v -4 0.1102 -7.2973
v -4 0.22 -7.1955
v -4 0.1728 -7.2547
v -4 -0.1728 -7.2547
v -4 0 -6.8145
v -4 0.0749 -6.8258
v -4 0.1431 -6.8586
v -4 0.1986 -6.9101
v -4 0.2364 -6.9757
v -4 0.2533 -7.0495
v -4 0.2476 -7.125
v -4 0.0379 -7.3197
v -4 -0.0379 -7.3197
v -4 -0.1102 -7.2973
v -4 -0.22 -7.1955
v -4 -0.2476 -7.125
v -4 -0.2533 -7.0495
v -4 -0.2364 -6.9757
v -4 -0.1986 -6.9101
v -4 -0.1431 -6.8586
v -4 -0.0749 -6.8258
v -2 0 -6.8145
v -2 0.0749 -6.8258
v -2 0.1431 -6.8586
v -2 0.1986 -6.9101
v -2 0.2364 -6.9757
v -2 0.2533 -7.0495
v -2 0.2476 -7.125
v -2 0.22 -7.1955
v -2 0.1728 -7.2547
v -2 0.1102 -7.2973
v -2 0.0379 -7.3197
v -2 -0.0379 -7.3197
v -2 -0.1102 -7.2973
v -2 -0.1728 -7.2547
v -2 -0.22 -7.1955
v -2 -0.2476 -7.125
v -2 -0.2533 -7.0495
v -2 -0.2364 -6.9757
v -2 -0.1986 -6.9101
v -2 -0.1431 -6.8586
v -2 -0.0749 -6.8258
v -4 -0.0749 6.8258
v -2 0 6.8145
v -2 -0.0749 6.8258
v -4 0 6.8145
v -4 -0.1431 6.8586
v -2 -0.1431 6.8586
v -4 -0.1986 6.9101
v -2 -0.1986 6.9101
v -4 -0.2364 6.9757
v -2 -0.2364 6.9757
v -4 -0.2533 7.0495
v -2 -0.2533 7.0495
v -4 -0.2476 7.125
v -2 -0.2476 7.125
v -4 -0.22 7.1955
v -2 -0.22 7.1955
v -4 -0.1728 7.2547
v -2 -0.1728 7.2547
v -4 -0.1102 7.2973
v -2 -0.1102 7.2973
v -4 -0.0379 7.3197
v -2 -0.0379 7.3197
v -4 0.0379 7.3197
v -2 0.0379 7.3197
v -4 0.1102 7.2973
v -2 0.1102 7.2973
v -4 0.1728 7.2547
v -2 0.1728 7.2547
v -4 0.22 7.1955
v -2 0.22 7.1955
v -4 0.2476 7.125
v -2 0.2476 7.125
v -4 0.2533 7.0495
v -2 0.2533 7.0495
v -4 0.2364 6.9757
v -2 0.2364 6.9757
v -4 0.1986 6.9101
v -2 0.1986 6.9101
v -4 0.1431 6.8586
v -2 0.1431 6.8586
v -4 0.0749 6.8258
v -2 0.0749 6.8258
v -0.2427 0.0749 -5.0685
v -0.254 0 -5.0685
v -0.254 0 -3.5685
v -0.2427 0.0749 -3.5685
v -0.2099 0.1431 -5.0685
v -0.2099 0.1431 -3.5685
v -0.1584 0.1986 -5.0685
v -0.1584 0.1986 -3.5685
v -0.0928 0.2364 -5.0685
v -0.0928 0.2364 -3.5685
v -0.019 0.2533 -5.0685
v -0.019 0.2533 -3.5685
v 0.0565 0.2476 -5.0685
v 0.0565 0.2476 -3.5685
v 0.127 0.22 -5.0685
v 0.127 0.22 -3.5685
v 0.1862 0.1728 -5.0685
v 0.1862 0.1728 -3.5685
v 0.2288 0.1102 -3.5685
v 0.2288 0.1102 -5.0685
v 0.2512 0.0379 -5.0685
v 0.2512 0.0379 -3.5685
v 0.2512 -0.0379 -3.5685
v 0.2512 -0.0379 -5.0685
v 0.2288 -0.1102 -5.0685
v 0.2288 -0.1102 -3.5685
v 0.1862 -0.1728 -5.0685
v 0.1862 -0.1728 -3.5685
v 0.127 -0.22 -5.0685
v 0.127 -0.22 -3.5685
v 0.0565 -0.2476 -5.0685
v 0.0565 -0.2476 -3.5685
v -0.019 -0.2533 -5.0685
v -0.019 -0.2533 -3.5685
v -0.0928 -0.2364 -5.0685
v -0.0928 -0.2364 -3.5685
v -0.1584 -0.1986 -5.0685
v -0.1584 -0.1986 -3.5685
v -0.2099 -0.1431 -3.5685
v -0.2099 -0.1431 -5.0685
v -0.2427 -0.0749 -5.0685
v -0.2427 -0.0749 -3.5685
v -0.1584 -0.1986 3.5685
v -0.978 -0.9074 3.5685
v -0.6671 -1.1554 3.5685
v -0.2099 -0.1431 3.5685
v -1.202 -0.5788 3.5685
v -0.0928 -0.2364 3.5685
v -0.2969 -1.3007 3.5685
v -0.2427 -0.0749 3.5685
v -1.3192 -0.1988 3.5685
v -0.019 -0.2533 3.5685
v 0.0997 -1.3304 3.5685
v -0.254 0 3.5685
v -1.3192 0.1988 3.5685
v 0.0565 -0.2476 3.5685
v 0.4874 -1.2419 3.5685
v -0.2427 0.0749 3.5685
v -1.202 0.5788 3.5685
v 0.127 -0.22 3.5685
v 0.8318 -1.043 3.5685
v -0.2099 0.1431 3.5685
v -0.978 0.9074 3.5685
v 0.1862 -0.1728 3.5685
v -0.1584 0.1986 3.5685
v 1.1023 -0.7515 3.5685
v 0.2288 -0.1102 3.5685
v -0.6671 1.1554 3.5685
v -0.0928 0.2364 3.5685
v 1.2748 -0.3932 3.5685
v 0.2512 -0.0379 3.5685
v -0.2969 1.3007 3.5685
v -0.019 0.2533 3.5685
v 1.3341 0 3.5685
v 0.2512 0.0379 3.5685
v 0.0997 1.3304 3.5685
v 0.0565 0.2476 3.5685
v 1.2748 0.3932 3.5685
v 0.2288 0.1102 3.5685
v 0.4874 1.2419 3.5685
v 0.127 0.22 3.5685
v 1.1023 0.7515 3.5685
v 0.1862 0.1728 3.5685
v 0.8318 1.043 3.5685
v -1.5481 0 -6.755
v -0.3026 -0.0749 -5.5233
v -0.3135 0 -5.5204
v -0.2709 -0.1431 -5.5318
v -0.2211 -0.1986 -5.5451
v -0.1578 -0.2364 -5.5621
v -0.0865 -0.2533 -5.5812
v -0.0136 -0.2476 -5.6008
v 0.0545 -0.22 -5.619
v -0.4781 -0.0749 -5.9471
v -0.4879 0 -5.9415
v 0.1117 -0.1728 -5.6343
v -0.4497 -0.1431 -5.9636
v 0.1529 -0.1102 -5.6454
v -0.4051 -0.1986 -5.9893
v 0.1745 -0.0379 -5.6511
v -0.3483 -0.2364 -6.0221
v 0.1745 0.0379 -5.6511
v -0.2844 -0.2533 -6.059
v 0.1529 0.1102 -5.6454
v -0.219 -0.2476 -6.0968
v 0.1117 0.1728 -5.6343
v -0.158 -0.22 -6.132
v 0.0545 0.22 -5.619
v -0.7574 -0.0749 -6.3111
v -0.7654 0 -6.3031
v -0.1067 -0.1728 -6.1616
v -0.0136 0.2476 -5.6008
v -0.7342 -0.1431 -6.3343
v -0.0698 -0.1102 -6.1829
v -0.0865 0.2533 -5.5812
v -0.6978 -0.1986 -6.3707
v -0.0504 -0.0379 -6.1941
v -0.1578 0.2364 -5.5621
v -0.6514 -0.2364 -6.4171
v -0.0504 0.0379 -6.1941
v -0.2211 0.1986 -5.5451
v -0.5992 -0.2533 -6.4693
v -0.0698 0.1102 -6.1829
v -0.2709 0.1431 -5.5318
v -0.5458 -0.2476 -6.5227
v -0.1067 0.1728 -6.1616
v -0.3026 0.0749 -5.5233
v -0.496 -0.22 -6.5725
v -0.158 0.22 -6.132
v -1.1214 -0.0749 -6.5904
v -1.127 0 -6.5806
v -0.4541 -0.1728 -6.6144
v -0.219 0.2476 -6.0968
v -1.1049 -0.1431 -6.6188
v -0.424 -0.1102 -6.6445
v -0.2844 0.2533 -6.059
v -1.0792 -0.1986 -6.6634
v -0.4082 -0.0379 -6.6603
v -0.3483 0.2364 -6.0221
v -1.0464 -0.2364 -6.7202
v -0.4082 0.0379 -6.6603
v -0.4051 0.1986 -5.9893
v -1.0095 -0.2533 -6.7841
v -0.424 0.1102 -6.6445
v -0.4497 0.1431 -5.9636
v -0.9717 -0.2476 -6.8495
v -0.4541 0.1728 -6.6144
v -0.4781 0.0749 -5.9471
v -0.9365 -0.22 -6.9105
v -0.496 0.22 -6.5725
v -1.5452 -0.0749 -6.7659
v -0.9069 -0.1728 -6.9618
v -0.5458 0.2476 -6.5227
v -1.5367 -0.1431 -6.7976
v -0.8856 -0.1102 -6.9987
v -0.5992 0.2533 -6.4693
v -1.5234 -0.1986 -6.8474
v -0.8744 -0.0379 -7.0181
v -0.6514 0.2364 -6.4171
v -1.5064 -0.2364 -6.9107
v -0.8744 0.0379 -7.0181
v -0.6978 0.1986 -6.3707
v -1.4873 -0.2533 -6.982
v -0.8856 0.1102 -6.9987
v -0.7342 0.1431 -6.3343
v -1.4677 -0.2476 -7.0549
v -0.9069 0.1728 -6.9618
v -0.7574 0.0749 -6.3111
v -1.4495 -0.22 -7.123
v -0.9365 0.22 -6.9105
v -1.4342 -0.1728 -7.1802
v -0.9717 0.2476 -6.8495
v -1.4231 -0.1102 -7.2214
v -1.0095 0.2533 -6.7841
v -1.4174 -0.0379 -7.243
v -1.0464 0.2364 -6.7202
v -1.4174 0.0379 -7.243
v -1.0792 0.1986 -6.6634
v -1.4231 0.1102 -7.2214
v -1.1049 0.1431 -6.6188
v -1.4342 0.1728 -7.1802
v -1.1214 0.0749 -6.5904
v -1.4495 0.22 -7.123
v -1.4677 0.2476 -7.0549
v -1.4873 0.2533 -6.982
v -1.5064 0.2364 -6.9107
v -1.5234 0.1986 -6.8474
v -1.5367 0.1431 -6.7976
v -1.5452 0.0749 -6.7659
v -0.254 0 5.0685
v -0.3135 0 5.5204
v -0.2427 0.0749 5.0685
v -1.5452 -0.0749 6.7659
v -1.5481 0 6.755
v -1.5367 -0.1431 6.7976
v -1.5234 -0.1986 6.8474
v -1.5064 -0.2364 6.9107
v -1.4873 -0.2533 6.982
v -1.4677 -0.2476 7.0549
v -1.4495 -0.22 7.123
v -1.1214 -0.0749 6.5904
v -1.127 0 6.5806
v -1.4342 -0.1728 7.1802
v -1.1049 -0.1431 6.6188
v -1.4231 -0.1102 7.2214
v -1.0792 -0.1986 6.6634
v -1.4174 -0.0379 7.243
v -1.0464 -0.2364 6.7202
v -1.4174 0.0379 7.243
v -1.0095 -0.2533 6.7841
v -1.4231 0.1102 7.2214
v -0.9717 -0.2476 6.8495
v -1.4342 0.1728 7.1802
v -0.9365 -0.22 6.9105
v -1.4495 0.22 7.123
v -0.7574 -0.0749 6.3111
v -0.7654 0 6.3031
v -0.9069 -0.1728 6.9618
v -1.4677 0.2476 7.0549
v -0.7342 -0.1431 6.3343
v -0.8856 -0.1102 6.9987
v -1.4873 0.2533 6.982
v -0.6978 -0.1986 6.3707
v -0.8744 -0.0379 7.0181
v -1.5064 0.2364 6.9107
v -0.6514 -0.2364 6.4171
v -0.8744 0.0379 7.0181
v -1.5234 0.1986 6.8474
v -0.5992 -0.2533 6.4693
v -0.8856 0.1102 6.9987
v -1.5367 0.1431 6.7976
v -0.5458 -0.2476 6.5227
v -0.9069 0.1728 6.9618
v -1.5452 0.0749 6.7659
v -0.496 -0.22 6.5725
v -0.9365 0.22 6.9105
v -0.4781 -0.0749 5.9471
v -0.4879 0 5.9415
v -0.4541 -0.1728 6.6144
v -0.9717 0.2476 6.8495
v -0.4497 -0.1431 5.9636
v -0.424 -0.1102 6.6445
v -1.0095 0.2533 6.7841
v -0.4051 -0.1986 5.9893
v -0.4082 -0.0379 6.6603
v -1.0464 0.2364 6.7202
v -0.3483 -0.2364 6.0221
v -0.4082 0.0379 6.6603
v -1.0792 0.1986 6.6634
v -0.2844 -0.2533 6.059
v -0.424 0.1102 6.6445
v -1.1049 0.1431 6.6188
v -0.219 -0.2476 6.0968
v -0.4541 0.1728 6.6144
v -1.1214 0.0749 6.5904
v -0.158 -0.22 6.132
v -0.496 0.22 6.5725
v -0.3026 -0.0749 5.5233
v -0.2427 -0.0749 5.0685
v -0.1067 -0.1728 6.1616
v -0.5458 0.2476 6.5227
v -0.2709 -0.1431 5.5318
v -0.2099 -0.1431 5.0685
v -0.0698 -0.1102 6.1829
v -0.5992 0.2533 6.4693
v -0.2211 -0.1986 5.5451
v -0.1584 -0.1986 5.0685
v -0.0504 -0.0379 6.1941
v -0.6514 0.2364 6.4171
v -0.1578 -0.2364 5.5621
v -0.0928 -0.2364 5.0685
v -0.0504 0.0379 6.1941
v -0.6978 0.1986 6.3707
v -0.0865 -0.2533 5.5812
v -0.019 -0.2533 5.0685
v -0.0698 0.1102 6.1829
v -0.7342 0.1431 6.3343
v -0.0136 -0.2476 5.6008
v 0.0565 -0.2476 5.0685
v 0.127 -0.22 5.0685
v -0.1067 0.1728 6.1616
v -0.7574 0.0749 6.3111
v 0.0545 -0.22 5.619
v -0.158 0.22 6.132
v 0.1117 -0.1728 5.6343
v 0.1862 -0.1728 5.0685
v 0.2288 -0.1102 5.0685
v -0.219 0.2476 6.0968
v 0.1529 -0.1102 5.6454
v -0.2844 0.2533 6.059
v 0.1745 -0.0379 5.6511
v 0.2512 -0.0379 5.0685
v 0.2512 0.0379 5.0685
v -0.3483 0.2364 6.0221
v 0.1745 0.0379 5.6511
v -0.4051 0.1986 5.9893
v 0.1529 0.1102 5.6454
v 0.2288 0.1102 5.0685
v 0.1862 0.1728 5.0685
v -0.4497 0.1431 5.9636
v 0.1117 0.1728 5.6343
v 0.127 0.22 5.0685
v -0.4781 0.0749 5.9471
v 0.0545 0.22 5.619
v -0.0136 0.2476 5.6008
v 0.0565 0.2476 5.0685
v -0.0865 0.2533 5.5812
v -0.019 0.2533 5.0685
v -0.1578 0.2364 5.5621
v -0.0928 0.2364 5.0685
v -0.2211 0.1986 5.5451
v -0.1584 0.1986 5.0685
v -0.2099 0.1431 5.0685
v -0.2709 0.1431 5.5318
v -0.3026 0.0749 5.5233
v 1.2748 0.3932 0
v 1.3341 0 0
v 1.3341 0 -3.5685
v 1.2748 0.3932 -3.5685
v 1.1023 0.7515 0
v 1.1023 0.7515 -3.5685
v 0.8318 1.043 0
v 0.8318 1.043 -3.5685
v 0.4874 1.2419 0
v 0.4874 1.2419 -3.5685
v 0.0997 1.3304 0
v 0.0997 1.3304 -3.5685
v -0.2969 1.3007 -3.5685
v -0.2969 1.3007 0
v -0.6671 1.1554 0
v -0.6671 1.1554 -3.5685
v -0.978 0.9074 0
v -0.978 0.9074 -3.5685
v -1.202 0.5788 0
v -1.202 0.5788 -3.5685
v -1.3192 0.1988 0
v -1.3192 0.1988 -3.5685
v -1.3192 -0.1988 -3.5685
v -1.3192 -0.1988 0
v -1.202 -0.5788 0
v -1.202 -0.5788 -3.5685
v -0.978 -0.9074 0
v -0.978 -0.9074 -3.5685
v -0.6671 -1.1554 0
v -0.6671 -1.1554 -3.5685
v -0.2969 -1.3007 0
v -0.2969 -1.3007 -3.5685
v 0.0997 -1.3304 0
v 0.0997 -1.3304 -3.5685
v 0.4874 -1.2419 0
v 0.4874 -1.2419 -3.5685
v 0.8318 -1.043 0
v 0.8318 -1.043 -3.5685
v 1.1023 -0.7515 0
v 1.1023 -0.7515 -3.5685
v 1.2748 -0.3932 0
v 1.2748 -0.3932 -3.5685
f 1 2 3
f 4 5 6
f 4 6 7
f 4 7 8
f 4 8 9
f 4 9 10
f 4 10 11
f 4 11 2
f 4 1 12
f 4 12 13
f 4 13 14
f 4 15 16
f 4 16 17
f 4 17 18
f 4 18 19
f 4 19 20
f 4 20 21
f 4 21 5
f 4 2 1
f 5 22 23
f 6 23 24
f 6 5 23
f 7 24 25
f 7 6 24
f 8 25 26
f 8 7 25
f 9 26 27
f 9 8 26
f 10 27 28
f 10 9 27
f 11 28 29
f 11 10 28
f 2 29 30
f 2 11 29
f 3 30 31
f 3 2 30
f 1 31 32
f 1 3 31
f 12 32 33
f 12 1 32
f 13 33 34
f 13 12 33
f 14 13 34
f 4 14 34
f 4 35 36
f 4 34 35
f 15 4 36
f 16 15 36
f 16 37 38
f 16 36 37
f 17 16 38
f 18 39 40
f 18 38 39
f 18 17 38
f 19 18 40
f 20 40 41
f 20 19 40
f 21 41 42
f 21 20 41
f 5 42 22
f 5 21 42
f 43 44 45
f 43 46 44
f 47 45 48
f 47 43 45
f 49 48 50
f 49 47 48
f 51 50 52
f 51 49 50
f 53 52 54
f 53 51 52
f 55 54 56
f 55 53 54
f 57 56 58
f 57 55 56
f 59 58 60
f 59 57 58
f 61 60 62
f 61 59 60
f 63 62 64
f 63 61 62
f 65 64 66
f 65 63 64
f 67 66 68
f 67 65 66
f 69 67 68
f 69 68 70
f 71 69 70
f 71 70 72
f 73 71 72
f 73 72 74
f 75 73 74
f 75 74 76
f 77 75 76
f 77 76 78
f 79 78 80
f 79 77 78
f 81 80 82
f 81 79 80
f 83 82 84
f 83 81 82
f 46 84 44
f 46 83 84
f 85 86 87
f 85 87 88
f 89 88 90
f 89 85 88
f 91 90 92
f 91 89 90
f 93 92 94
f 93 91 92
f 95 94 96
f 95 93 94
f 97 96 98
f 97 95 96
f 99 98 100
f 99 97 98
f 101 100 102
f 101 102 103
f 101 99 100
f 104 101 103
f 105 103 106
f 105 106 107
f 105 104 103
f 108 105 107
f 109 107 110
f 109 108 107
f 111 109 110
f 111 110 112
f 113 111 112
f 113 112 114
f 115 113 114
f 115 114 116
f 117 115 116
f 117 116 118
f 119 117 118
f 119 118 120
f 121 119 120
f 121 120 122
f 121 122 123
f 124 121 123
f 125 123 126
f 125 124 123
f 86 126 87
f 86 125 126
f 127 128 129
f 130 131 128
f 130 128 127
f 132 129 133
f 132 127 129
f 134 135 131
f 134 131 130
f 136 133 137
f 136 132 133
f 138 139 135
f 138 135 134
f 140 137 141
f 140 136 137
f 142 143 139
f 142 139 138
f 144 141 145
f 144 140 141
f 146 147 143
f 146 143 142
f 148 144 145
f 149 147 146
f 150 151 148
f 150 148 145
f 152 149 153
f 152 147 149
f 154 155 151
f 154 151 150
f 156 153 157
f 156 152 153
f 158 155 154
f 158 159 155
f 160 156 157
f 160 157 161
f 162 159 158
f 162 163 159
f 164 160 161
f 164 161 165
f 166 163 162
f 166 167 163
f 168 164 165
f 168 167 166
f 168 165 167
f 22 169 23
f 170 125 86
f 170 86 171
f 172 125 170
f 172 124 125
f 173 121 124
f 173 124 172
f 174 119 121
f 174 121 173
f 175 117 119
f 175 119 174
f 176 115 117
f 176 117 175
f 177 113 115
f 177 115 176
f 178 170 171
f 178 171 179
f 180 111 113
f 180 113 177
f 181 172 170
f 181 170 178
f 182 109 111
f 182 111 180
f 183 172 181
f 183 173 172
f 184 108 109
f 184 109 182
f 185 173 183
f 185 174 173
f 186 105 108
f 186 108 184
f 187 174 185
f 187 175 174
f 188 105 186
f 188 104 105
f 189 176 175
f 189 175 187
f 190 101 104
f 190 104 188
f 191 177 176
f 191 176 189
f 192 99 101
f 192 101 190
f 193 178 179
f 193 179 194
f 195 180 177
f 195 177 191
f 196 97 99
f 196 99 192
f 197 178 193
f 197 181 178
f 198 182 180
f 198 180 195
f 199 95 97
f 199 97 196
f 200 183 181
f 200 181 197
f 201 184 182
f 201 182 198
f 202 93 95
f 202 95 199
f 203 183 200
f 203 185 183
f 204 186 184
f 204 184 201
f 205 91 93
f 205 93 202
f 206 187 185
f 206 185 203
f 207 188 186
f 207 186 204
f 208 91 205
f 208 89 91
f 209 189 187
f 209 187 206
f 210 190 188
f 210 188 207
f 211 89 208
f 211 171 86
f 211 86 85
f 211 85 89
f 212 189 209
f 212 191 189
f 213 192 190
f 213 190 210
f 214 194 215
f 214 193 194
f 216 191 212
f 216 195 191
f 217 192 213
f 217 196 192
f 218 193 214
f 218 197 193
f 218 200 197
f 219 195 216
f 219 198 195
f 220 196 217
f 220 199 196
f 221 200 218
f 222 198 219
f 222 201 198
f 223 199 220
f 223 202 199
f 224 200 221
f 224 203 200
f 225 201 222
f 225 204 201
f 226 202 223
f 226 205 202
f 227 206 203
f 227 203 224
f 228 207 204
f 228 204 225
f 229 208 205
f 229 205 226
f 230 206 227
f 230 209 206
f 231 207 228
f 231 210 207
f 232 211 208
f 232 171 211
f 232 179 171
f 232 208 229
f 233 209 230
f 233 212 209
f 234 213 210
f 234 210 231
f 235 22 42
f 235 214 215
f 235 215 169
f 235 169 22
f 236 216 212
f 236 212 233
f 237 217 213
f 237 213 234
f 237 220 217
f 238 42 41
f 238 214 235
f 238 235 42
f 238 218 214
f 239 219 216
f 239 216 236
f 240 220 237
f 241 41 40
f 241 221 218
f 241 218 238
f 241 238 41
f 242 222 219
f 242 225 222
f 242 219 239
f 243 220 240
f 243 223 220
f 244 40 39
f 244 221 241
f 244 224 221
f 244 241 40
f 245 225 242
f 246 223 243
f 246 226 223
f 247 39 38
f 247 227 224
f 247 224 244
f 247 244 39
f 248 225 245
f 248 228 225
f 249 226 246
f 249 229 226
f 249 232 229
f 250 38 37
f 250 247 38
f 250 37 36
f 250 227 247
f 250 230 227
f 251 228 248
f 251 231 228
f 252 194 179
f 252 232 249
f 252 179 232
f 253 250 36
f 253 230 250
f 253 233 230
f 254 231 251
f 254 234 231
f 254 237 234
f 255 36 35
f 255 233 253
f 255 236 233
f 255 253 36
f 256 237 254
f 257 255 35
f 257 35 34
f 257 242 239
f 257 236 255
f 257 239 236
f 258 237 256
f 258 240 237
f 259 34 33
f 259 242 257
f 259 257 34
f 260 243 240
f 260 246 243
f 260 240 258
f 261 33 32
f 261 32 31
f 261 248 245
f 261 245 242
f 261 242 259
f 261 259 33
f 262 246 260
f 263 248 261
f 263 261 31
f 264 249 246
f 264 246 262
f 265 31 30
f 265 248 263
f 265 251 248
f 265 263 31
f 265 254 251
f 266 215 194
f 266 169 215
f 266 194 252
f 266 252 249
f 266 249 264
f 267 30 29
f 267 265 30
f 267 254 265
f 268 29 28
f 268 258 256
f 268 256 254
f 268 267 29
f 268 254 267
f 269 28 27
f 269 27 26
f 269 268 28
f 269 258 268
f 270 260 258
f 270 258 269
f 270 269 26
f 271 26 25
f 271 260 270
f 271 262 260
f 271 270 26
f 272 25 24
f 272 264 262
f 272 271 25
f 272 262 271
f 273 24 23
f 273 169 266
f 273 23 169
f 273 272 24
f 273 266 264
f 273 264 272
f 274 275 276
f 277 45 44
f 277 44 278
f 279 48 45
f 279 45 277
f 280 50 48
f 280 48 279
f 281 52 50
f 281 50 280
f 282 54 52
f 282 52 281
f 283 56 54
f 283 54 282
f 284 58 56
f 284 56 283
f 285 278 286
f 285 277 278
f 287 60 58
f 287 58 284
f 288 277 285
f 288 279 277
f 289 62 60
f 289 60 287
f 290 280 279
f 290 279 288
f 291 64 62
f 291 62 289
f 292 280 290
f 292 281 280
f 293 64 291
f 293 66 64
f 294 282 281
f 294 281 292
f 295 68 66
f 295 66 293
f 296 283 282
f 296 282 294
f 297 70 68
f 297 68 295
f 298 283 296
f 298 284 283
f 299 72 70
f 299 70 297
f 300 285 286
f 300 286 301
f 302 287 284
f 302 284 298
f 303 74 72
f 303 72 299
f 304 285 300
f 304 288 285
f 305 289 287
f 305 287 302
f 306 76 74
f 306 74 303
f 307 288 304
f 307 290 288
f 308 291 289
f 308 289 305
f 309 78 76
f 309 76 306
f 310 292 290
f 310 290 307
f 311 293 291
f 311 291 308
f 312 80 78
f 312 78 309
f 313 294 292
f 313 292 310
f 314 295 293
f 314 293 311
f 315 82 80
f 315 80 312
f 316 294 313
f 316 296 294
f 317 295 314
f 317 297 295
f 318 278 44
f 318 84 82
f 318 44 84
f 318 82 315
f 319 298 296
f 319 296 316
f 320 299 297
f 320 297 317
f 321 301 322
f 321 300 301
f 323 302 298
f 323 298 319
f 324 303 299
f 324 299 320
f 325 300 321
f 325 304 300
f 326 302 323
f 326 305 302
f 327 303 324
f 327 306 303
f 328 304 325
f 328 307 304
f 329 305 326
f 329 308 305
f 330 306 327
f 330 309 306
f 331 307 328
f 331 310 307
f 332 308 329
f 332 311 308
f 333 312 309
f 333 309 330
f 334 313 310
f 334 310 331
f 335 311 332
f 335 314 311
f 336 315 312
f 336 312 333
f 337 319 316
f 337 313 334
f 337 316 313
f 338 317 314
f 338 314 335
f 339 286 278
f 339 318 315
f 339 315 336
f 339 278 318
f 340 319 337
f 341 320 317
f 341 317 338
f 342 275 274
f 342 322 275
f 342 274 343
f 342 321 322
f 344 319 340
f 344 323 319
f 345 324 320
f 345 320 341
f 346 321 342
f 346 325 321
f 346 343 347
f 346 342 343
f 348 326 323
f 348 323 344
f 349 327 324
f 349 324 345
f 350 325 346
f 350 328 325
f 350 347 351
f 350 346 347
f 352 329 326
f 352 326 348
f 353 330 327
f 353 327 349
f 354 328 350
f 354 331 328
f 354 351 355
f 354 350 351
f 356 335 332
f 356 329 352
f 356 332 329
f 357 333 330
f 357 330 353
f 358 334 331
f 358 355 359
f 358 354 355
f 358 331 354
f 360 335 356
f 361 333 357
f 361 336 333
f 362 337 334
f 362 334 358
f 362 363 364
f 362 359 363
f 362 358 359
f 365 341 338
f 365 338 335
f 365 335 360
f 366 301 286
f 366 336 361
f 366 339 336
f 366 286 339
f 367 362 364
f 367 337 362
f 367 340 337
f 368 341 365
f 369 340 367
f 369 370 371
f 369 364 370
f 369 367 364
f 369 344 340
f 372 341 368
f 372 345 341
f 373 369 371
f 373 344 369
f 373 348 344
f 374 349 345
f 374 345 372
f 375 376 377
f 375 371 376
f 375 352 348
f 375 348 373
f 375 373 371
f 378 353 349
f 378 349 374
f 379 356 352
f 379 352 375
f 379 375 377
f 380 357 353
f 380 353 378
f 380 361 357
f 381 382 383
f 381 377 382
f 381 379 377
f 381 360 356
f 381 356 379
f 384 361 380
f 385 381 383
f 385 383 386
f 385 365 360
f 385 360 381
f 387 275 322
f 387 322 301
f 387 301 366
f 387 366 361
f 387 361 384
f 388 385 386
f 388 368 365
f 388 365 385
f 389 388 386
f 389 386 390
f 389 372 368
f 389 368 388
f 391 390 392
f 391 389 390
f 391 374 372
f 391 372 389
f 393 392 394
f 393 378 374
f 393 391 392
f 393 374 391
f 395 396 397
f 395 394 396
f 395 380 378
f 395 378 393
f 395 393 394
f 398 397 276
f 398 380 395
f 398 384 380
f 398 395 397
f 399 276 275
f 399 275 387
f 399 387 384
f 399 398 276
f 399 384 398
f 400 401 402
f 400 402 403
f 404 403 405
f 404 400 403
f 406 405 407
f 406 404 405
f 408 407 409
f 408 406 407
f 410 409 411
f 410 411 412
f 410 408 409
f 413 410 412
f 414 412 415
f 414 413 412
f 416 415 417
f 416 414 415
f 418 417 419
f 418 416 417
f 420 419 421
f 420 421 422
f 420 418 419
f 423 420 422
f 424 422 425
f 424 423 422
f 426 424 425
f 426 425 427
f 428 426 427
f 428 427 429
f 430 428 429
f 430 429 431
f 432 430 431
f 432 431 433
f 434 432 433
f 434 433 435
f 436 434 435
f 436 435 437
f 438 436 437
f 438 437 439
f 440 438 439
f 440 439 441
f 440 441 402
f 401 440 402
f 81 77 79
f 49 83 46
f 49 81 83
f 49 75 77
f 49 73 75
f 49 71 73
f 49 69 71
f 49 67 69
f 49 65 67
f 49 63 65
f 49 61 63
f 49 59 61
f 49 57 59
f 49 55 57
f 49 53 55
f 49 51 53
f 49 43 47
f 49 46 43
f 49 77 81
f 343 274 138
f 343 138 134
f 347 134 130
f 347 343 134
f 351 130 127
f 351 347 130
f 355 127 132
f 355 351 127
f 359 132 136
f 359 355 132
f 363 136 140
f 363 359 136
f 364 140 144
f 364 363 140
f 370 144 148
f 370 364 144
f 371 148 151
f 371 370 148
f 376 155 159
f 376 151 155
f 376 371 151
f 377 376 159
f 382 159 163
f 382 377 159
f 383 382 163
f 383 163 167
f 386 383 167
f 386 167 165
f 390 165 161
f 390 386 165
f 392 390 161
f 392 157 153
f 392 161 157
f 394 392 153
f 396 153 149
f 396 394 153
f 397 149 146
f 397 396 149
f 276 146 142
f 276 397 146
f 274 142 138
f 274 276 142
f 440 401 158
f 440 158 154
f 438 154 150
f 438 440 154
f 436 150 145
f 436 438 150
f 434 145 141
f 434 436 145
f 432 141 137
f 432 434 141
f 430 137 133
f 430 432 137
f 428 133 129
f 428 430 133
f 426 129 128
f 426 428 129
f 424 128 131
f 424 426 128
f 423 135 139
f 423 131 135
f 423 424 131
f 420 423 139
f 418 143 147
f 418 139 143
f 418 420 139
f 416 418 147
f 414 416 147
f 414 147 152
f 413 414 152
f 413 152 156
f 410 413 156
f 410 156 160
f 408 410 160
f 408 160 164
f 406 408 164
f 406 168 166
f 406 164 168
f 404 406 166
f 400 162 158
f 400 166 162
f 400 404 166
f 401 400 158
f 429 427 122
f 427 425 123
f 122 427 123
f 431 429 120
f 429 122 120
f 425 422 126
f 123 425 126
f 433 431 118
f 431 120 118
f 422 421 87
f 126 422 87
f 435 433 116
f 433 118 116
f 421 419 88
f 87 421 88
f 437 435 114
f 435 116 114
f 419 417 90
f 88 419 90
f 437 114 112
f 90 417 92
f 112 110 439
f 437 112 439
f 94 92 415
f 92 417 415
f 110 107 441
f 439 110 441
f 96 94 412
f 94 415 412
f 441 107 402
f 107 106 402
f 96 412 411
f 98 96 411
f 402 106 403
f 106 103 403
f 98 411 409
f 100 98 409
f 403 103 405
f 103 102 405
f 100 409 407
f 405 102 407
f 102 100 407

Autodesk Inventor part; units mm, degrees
ref_plane "YZ Plane" through (0, 0, 0) normal (1, 0, 0) x (0, 1, 0)
ref_plane "XZ Plane" through (0, 0, 0) normal (0, 1, 0) x (-1, 0, 0)
ref_plane "XY Plane" through (0, 0, 0) normal (0, 0, 1) x (1, 0, 0)
sketch "Sketch1" plane through (0, 0, 0) normal (0, 0, 1) x (1, 0, 0)
  circle A0 centre (0, 0) radius 1.3341
  dimension "d0" = 2.6682
extrude "Extrusion1" add sketch "Sketch1" along normal mid plane 7.137
sketch "Sketch2" plane through (0, 0, 3.5685) normal (0, 0, 1) x (1, 0, 0)
  circle A0 centre (0, 0) radius 0.25
  dimension "d7" = 0.5
sketch3d "3D Sketch2"
sweep "Sweep1" [suppressed]
sketch "Sketch3" plane through (0, 0, -3.5685) normal (0, 0, -1) x (-1, 0, 0)
  circle A0 centre (0, 0) radius 0.25
  dimension "d18" = 0.5
sketch3d "3D Sketch3"
sweep "Sweep2" [suppressed]
sketch "Sketch4" plane through (0, 0, 3.5685) normal (0, 0, 1) x (1, 0, 0)
  circle A0 centre (0, 0) radius 0.25
  dimension "d25" = 0.5
sketch3d "3D Sketch4"
sweep "Sweep3" [suppressed]
sketch "Sketch5" plane through (0, 0, -3.5685) normal (0, 0, -1) x (-1, 0, 0)
  circle A0 centre (0, 0) radius 0.254
  dimension "d34" = 0.508
sketch3d "3D Sketch5"
  line L0 (0, 0, -3.5685) -> (0, 0, -5.0685)
  arc A0 (0, 0, -5.0685) -> (-2, 0, -7.0685) centre (-2, 0, -5.0685) ccw
  line L1 (-2, 0, -7.0685) -> (-4, 0, -7.0685)
  dimension "d52" = 3.5
  dimension "d53" = 4
  dimension "d36" = 2
sweep "Sweep4" add profiles "Sketch5" path "3D Sketch5"
sketch "Sketch7" plane through (0, 0, 3.5685) normal (0, 0, 1) x (1, 0, 0)
  circle A0 centre (0, 0) radius 1.3341 projected
  circle A1 centre (0, 0) radius 0.254
  dimension "d45" = 0.508
sketch3d "3D Sketch7"
sweep "Sweep6" [suppressed]
mirror "Mirror2" about plane through (0, 0, 0) normal (0, 0, 1) of "Sweep4"
properties part number "VISHAY-DALE RWR81S6R98FRB12" material "SMT (95% LCP, 5% PhosBr)"
